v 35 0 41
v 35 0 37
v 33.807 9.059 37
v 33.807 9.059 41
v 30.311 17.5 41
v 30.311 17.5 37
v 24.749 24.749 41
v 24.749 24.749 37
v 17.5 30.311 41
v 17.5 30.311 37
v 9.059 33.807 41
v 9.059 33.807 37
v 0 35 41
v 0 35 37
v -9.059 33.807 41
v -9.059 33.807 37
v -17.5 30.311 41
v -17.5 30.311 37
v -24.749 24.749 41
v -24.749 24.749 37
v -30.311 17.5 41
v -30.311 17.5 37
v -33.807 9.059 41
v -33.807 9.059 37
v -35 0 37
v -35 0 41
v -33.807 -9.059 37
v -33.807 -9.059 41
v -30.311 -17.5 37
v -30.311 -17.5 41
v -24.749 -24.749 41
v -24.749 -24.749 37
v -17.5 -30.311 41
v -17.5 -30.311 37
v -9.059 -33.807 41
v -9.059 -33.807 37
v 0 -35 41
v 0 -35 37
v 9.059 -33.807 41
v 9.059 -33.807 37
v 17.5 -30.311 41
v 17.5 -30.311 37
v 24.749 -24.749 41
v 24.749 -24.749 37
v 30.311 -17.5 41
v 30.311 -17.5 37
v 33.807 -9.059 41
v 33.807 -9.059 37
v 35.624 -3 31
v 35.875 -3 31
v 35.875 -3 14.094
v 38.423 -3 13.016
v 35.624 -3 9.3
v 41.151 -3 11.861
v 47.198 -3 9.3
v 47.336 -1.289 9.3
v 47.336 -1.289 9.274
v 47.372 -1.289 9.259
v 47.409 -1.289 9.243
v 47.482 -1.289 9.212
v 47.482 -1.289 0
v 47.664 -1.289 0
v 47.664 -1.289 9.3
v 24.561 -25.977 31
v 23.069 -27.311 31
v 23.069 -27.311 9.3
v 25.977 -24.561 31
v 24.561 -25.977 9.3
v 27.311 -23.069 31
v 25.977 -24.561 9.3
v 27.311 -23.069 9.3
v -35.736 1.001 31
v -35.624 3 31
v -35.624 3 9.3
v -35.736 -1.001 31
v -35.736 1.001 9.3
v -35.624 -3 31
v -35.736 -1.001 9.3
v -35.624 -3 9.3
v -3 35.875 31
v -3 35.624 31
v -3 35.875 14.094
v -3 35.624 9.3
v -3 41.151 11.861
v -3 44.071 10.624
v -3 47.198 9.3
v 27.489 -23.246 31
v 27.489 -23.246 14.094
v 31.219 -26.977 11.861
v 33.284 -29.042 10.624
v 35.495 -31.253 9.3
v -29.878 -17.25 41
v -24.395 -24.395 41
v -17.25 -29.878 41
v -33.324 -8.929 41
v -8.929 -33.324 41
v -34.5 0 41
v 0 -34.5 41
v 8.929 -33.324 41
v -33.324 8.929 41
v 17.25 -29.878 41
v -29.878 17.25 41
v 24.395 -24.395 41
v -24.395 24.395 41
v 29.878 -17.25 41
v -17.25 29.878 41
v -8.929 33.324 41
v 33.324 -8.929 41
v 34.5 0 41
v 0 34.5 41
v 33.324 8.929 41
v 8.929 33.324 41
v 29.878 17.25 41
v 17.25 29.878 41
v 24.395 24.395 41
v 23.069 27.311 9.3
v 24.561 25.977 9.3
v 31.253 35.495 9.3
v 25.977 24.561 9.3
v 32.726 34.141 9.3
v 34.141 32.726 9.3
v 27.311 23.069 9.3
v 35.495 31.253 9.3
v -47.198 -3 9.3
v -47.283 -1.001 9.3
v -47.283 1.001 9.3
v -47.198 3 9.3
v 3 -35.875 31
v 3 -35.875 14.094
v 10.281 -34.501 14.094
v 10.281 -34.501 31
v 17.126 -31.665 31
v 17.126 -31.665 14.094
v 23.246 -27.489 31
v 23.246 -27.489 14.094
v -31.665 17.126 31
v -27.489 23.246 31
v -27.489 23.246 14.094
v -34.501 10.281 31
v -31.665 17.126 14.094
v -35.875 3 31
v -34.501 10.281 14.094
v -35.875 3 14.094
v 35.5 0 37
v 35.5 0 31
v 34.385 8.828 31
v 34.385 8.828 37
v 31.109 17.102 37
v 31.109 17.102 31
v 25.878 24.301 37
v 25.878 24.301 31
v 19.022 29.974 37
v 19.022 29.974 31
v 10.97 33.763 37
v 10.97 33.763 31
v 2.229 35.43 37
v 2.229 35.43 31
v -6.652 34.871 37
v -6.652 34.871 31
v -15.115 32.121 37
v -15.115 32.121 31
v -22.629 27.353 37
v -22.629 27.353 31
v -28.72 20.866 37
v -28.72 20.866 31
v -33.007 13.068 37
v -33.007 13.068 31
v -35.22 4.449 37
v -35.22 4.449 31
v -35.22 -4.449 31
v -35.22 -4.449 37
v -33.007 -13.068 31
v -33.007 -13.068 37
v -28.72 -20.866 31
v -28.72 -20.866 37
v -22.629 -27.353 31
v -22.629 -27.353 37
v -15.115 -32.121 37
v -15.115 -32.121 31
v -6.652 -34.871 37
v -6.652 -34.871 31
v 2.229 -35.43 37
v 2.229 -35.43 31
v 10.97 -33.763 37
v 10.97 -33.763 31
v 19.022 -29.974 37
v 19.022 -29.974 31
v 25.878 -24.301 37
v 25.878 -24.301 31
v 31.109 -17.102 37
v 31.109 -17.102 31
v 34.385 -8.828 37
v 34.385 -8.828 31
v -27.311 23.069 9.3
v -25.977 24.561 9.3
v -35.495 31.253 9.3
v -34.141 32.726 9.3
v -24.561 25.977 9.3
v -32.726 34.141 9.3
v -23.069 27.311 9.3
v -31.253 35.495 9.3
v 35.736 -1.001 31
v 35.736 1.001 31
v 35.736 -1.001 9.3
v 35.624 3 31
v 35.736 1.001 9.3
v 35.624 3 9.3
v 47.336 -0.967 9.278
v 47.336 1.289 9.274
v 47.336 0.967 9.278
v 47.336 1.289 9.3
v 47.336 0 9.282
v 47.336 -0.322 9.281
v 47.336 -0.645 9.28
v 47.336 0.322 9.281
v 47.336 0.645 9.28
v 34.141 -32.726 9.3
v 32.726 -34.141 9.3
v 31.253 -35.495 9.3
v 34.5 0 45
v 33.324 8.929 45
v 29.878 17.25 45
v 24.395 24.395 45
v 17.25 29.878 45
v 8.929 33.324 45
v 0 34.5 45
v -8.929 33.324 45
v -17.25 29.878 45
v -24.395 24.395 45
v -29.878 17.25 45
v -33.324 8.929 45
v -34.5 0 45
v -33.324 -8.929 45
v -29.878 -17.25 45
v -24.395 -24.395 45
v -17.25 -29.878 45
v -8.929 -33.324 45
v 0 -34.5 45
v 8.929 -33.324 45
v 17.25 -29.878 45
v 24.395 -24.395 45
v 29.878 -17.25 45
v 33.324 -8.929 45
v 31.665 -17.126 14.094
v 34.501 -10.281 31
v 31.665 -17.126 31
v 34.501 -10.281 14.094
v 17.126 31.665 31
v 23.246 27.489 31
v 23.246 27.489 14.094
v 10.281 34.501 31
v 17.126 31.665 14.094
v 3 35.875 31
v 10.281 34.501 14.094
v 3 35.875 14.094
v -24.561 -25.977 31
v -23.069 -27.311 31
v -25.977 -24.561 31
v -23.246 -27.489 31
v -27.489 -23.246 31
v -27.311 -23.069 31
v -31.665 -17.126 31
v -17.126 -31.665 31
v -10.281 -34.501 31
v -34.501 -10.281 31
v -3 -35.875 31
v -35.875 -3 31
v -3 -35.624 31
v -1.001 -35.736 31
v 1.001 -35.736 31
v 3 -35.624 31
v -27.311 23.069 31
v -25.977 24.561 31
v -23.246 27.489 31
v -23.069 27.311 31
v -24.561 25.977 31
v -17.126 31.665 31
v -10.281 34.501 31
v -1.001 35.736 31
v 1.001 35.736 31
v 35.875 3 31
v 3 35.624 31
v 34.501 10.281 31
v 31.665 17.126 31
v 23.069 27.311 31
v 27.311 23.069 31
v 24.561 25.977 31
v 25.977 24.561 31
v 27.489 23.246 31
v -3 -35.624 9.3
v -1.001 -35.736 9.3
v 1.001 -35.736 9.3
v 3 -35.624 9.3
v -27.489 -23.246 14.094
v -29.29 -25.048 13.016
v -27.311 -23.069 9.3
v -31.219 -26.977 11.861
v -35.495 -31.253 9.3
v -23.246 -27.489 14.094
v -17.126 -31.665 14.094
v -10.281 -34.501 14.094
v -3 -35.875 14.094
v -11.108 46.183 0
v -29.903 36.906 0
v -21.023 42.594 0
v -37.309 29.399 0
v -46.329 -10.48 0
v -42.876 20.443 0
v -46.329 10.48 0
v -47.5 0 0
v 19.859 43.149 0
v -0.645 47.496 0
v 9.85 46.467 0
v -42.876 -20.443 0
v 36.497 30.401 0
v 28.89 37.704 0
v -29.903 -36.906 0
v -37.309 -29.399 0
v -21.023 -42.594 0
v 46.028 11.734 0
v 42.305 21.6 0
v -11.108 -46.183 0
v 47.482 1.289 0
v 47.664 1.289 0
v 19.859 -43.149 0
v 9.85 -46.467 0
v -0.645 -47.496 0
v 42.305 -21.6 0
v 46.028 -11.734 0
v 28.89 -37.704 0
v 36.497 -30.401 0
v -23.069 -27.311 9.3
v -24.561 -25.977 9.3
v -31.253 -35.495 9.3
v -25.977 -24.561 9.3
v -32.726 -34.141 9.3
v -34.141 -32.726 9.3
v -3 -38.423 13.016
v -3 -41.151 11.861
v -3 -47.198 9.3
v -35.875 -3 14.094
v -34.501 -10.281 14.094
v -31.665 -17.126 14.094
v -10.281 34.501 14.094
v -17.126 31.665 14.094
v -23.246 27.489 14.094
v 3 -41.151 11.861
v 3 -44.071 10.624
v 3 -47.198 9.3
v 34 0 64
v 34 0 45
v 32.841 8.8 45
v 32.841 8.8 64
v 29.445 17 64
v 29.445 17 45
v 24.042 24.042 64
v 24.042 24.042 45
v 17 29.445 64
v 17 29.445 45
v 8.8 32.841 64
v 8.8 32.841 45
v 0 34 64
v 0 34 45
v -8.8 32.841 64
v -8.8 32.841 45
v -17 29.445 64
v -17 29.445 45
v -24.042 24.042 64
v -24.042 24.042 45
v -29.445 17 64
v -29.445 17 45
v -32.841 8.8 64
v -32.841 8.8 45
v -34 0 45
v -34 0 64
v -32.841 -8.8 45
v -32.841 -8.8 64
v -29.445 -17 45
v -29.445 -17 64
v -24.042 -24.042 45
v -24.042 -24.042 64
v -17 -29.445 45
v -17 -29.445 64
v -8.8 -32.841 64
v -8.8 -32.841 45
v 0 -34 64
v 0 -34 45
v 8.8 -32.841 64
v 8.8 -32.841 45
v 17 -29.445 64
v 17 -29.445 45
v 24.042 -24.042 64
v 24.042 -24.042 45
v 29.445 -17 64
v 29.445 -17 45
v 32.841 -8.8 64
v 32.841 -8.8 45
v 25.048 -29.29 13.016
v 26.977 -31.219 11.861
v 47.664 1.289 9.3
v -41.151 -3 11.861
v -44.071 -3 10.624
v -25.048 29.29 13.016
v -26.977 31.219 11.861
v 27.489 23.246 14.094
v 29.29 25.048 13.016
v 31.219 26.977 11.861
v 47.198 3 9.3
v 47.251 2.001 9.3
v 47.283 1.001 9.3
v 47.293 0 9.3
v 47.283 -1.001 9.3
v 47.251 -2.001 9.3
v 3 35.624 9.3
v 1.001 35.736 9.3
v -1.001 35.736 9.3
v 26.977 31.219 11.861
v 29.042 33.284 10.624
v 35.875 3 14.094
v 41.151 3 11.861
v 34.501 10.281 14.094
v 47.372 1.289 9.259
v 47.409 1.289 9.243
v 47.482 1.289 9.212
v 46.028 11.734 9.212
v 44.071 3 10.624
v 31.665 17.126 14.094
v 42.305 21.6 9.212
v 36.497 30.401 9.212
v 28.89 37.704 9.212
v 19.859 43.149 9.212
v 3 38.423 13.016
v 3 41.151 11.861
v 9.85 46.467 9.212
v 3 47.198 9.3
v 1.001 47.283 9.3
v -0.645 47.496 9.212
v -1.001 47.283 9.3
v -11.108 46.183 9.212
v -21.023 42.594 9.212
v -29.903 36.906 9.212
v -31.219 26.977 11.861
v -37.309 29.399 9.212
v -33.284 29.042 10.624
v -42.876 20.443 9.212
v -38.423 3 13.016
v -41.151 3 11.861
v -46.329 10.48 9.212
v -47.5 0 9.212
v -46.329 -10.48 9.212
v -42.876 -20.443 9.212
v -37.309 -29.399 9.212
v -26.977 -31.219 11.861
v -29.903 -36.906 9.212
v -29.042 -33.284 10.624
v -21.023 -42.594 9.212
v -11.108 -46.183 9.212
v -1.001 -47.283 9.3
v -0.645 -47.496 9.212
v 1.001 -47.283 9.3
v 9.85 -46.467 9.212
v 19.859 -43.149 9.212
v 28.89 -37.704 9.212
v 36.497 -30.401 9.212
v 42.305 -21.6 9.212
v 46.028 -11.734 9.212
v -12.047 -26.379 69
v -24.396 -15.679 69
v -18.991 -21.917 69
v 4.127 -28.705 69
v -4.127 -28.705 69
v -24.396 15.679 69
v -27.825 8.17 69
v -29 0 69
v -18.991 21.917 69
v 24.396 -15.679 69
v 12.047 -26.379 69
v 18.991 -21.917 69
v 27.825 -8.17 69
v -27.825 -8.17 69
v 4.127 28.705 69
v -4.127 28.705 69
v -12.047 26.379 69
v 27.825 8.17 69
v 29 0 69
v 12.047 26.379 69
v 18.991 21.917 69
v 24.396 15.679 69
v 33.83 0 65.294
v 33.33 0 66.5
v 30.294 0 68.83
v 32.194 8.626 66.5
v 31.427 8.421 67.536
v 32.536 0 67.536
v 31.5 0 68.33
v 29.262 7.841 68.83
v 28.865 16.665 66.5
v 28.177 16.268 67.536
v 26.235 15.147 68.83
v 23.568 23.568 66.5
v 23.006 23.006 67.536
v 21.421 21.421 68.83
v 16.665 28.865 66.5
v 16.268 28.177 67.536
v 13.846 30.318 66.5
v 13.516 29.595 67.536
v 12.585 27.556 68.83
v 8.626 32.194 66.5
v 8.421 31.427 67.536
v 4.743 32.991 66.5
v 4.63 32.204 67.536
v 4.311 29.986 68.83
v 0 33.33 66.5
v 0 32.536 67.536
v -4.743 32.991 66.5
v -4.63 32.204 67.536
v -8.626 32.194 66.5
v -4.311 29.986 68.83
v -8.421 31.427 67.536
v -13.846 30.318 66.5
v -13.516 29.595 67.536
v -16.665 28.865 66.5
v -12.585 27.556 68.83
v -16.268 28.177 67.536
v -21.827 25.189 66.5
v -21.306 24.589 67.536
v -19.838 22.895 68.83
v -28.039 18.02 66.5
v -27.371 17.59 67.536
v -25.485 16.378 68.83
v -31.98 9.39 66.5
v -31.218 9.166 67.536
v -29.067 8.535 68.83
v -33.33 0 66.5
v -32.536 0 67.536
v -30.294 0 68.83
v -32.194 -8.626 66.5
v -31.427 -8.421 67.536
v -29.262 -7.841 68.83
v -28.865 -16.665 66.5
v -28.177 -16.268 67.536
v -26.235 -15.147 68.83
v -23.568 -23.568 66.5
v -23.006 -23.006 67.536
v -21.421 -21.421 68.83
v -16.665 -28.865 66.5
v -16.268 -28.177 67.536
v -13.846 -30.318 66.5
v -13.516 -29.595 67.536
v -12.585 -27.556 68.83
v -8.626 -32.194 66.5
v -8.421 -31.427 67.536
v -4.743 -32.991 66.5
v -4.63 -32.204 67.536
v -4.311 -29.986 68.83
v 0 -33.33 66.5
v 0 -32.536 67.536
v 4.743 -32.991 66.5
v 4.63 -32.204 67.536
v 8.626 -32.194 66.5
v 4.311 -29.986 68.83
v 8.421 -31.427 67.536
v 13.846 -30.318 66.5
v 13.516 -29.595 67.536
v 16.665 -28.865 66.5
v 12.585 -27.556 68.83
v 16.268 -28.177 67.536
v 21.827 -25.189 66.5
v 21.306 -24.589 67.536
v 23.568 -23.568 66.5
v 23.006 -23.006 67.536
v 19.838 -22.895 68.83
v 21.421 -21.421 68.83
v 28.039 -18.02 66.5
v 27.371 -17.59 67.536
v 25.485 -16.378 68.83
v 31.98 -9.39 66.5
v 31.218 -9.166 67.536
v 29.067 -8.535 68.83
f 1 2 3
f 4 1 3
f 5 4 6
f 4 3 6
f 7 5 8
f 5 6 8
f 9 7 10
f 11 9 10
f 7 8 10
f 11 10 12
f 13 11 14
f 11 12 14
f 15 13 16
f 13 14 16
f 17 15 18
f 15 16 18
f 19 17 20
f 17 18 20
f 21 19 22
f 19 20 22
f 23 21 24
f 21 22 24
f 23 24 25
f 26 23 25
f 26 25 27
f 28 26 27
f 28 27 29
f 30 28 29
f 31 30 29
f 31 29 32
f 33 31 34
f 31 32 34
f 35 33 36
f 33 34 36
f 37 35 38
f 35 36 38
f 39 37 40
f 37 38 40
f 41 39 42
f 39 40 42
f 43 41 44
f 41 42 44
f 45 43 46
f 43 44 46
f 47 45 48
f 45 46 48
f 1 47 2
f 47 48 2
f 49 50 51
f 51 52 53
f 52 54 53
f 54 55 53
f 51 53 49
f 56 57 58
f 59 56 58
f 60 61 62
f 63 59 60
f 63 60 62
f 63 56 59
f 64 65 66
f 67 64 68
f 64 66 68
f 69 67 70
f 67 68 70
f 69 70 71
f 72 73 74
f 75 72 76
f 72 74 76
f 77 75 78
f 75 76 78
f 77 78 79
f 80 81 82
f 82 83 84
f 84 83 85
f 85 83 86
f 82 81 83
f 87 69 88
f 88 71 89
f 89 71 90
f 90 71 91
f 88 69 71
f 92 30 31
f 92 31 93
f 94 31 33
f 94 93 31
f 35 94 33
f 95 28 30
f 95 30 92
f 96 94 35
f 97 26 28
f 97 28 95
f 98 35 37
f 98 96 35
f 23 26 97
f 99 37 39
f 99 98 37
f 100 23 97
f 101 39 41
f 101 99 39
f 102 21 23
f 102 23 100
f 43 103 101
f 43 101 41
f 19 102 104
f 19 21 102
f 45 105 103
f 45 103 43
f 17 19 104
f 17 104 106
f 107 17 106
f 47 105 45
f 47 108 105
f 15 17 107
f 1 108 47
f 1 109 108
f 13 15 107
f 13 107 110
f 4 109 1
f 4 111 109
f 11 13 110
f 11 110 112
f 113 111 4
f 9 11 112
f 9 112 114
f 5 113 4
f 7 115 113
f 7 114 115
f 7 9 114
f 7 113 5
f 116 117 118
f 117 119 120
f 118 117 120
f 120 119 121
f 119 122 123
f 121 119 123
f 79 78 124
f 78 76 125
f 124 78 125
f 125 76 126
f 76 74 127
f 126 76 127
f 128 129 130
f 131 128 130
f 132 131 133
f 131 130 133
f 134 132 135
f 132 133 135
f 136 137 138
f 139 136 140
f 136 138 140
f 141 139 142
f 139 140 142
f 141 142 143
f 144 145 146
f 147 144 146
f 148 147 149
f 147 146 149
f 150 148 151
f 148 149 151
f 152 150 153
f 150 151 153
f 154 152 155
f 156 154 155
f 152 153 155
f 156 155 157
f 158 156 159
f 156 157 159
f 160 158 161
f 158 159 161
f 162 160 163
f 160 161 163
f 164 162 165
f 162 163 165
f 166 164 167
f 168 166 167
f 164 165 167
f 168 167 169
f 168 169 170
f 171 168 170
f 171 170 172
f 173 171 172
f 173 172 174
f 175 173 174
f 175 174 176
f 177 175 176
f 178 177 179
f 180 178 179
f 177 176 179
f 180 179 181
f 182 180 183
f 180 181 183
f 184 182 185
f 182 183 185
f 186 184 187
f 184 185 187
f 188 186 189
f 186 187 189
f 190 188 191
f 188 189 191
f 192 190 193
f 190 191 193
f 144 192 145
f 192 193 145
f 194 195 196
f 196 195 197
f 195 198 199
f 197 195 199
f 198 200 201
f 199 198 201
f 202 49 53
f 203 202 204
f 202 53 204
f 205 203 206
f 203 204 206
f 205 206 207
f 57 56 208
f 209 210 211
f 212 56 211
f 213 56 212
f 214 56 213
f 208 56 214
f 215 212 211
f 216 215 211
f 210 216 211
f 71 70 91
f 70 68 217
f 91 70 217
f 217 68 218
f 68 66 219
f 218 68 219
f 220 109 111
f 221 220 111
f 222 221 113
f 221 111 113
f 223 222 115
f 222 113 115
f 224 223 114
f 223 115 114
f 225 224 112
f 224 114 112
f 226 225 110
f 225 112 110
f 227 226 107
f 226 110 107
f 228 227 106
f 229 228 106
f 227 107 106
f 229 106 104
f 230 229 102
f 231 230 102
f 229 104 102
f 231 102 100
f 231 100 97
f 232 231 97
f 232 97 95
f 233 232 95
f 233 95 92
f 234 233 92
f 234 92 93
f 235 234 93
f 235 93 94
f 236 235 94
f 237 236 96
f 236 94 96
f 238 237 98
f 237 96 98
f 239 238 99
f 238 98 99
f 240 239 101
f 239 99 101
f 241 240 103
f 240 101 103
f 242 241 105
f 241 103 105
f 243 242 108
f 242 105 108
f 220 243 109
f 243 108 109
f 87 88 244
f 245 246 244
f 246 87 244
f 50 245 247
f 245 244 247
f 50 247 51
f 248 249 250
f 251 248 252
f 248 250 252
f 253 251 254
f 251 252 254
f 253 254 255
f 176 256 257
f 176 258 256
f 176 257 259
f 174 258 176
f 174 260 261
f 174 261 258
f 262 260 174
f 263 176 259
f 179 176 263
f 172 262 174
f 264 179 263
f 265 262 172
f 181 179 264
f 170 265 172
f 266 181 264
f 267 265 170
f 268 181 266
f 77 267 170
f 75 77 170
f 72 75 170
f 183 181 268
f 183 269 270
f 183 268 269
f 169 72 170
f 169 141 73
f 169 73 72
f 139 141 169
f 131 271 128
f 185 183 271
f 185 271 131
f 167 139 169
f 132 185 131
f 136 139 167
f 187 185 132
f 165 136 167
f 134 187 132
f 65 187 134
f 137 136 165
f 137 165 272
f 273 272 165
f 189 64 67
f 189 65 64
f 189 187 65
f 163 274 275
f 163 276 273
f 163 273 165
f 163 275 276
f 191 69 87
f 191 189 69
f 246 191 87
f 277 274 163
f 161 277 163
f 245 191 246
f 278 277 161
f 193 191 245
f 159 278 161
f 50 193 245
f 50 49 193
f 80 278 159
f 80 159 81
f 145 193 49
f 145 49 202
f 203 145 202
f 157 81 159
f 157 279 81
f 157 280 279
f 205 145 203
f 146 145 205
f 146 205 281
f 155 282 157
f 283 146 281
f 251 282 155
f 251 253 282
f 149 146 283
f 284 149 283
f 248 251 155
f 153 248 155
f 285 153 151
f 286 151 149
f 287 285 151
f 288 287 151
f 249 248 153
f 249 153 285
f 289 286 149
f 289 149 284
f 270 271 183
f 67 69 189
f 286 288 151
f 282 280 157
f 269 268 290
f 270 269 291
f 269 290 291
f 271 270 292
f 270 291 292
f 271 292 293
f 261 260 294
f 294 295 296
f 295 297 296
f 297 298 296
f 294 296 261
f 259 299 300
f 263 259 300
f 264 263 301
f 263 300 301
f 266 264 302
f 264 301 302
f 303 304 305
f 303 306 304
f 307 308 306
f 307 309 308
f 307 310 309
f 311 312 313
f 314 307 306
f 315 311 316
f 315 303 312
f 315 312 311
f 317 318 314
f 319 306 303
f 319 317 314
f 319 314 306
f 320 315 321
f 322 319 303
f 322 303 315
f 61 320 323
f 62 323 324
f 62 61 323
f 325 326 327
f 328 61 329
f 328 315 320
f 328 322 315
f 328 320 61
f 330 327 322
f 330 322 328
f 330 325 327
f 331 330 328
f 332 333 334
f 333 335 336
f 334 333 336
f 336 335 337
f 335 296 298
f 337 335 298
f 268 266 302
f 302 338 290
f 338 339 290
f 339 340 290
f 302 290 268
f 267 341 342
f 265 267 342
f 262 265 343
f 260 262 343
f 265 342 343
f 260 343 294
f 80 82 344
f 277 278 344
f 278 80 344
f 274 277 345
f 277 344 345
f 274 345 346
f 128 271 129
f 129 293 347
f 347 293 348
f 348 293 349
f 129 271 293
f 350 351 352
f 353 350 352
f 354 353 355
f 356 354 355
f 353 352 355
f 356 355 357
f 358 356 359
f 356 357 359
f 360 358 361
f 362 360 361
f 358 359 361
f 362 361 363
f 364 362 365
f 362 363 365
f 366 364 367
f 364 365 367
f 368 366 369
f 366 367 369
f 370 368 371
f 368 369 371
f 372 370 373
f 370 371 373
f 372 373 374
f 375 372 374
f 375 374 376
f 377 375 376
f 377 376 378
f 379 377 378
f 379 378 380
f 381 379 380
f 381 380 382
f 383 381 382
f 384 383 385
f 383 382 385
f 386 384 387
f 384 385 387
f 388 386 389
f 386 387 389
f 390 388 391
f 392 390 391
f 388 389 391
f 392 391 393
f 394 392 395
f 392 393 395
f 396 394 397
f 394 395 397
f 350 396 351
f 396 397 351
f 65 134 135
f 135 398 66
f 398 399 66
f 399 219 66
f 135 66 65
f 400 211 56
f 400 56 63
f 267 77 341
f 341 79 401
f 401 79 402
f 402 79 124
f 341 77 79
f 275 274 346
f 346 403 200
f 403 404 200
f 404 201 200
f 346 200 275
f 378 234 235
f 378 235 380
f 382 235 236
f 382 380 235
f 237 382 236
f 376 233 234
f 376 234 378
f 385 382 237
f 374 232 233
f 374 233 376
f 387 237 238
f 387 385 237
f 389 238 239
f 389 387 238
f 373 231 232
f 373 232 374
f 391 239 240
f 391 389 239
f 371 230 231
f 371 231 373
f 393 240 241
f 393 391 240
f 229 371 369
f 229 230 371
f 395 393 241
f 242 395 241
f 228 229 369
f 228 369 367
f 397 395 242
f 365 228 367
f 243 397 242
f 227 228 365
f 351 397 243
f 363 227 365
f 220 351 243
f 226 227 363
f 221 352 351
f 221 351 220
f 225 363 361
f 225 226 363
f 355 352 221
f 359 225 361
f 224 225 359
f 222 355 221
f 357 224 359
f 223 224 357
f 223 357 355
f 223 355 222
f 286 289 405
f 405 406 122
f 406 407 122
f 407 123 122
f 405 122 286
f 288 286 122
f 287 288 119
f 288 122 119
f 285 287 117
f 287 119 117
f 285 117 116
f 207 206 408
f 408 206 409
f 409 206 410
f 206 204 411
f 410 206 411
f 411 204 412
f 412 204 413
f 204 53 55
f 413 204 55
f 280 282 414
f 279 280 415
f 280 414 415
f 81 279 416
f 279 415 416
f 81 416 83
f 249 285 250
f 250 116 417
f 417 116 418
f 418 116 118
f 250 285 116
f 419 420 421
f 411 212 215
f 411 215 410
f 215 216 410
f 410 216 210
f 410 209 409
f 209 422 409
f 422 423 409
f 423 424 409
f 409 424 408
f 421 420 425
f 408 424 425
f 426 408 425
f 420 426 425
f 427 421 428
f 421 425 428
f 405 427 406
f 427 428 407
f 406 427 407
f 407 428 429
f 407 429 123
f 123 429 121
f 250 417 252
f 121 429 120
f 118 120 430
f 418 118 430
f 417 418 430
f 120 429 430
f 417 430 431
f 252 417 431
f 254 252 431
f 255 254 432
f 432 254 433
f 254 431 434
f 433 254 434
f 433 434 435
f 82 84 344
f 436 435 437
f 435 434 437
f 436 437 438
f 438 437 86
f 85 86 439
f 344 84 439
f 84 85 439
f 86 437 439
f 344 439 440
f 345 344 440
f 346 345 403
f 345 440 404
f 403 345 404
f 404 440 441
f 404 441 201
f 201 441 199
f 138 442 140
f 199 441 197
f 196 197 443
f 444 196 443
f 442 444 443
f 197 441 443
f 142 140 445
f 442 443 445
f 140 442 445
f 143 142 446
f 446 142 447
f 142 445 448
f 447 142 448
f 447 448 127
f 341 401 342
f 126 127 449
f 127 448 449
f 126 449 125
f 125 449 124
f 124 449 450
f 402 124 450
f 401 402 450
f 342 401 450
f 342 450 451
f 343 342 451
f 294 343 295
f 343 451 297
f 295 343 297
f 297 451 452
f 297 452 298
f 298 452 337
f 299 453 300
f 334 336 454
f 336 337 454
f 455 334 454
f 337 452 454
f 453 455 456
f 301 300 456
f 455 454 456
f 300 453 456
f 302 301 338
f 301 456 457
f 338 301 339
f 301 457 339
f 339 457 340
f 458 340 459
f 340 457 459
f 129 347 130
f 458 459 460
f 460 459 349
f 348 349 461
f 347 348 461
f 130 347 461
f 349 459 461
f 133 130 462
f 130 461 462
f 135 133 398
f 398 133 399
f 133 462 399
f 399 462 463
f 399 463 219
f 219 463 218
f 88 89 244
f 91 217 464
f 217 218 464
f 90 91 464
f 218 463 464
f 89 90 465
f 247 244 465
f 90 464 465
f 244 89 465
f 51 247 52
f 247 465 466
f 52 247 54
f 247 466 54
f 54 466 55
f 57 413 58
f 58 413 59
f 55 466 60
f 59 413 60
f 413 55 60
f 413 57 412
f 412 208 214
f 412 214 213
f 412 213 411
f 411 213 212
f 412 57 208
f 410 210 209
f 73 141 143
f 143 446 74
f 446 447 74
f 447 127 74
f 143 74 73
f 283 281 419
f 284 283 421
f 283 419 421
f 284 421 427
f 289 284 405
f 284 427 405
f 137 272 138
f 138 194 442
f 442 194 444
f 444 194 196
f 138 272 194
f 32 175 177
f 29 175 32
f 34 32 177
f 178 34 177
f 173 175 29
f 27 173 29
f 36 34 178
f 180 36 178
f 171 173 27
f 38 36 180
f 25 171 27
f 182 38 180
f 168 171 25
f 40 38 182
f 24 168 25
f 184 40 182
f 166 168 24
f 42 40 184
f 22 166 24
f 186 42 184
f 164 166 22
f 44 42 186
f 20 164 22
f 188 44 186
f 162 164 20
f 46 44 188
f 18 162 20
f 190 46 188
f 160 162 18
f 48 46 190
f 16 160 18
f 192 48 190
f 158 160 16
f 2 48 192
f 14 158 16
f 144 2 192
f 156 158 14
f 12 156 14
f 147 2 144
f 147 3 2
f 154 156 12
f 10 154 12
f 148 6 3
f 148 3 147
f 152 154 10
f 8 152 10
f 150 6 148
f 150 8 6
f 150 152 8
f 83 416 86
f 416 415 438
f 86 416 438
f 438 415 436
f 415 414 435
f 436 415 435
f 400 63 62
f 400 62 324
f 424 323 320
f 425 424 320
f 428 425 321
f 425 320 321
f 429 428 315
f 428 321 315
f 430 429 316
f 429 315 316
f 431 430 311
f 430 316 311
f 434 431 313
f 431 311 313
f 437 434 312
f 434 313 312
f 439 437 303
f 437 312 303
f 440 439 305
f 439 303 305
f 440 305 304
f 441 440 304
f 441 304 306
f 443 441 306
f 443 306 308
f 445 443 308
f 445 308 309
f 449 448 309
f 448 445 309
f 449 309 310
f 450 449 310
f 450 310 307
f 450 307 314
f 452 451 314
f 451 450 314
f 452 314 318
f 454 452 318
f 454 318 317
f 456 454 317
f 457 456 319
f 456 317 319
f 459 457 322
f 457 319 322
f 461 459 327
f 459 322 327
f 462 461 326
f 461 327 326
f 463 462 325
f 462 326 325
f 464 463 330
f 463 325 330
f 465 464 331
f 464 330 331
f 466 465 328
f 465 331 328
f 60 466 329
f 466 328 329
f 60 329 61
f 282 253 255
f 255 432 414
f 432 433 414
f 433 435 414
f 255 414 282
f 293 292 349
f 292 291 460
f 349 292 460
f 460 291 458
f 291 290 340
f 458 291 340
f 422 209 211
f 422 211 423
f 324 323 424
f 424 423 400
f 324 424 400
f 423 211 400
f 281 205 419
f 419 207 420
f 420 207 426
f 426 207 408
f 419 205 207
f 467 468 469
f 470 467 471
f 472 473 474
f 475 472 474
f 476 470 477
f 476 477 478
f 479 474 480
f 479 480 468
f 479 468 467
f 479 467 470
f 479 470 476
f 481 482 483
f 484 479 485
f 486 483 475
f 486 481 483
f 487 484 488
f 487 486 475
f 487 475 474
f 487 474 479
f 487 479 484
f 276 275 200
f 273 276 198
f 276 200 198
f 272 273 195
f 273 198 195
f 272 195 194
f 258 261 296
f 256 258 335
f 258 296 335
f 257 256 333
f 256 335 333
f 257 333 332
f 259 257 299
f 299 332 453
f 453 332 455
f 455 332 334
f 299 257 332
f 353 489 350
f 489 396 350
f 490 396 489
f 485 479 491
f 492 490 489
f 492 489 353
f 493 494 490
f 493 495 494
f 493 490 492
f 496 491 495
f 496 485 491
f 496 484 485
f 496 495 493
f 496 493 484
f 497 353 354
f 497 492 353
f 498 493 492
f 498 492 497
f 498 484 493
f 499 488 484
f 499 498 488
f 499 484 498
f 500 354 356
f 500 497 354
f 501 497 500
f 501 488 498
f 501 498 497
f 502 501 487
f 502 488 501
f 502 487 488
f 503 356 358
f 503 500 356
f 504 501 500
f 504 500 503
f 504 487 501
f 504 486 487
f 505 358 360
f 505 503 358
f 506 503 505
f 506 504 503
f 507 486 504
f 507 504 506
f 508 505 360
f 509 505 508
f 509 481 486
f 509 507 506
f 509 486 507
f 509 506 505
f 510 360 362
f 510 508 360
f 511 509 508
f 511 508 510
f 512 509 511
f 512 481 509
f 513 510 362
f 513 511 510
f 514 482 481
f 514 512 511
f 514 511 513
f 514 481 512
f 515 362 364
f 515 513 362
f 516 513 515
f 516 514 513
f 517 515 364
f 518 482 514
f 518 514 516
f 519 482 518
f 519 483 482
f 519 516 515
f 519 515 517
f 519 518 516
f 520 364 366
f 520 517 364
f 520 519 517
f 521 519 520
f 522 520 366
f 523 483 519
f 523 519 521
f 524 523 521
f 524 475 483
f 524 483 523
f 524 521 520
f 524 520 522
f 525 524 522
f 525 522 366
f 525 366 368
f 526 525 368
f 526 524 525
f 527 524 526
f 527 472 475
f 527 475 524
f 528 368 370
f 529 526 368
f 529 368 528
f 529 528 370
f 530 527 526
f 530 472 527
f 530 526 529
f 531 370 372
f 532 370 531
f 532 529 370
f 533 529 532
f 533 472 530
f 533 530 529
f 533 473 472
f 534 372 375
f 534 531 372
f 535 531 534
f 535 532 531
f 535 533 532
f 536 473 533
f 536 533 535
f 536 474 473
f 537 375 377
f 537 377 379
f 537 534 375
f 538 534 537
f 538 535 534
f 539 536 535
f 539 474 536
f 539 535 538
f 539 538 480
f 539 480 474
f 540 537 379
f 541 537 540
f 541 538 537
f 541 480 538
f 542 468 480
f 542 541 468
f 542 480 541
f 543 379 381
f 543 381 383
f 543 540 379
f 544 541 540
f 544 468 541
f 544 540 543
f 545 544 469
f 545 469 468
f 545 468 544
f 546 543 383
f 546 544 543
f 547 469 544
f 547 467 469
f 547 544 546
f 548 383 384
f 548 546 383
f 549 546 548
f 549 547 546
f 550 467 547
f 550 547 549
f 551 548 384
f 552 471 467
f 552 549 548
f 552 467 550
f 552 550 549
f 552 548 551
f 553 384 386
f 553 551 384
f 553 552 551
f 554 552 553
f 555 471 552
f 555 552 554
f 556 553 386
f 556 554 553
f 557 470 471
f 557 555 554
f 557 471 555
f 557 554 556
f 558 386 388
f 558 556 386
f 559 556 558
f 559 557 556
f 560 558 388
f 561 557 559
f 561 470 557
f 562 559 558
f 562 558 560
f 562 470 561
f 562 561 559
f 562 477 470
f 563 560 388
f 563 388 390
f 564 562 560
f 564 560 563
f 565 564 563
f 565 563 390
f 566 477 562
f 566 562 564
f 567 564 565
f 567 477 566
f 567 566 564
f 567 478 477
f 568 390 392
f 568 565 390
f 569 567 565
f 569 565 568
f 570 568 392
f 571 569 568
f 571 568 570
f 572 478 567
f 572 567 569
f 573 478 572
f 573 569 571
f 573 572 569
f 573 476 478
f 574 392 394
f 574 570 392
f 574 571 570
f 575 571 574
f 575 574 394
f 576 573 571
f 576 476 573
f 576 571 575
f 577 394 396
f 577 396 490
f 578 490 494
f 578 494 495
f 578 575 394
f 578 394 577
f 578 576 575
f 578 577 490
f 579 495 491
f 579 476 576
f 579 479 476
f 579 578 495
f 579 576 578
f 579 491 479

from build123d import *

# Parameters (mm, degrees)
CROQUIS1_R              = 47.5
SALIENTE_EXTRUIR1_DEPTH = 9
CROQUIS2_R              = 36
SALIENTE_EXTRUIR2_DEPTH = 22
CROQUIS3_R              = 35.5
SALIENTE_EXTRUIR3_DEPTH = 6
CROQUIS4_R              = 35
SALIENTE_EXTRUIR4_DEPTH = 4
CROQUIS5_R              = 34.5
SALIENTE_EXTRUIR5_DEPTH = 4
CROQUIS6_R              = 34
SALIENTE_EXTRUIR6_DEPTH = 24
REDONDEO1_R             = 5
CHAFL_N1_SIZE           = 5.093697795
CHAFL_N1_SIZE_2         = 12
CORTAR_EXTRUIR1_START   = -59.7
CORTAR_EXTRUIR1_DEPTH   = 59.7
MATRIZC1_COUNT          = 8
SALIENTE_EXTRUIR7_REACH = 91.87
CROQUIS8_W              = 0.328373722
CROQUIS8_H              = 2.57874632


with BuildPart() as part:
    # Croquis1 → Saliente-Extruir1 (new body)
    with BuildSketch(Plane.XY):
        Circle(CROQUIS1_R)
    extrude(amount=SALIENTE_EXTRUIR1_DEPTH)

    # Croquis2 → Saliente-Extruir2 (add)
    with BuildSketch(Plane.XY.offset(9)):
        Circle(CROQUIS2_R)
    extrude(amount=SALIENTE_EXTRUIR2_DEPTH)

    # Croquis3 → Saliente-Extruir3 (add)
    with BuildSketch(Plane.XY.offset(31)):
        Circle(CROQUIS3_R)
    extrude(amount=SALIENTE_EXTRUIR3_DEPTH)

    # Croquis4 → Saliente-Extruir4 (add)
    with BuildSketch(Plane.XY.offset(37)):
        Circle(CROQUIS4_R)
    extrude(amount=SALIENTE_EXTRUIR4_DEPTH)

    # Croquis5 → Saliente-Extruir5 (add)
    with BuildSketch(Plane.XY.offset(41)):
        Circle(CROQUIS5_R)
    extrude(amount=SALIENTE_EXTRUIR5_DEPTH)

    # Croquis6 → Saliente-Extruir6 (add)
    with BuildSketch(Plane.XY.offset(45)):
        Circle(CROQUIS6_R)
    extrude(amount=SALIENTE_EXTRUIR6_DEPTH)

    # Redondeo1
    redondeo1_edges = [part.edges().sort_by_distance(p)[0] for p in [
        (-34, 0, 69),
    ]]
    fillet(redondeo1_edges, radius=REDONDEO1_R)

    # Chaflán1
    # the kernel refuses this chamfer: 12, 5.093697795 mm, written as the material it adds along each edge
    with BuildSketch(Plane(origin=(0, 0, 9), x_dir=(1, 0, 0), z_dir=(0, -1, 0))) as chafl_n1_piece_1_section:
        Polygon((36, CHAFL_N1_SIZE), (36 + CHAFL_N1_SIZE_2, 0), (36, 0), align=None)
    chafl_n1_piece_1 = revolve(axis=Axis((0, 0, 9), (0, 0, 1)), mode=Mode.PRIVATE)
    chafl_n1_piece_1 = chafl_n1_piece_1 & Plane(origin=(0, 0, 11.556485036), x_dir=(1, 0, 0), z_dir=(0, 0, -1)) * Cylinder(47.5, 192, mode=Mode.PRIVATE)
    add(chafl_n1_piece_1)

    # Croquis7 → Cortar-Extruir1 (cut)
    with BuildSketch(Plane.XY.offset(69).offset(CORTAR_EXTRUIR1_START)):
        with BuildLine():
            Line((-47.405168495, 3), (-35.624047548, 3))
            ThreePointArc((-35.624047548, 3), (-35.750143548, 0), (-35.624047548, -3))
            Line((-35.624047548, -3), (-47.405168495, -3))
            ThreePointArc((-47.405168495, -3), (-47.5, 0), (-47.405168495, 3))
        make_face()
    cortar_extruir1 = extrude(amount=CORTAR_EXTRUIR1_DEPTH, mode=Mode.SUBTRACT)

    # MatrizC1: Cortar-Extruir1 ×8 about axis
    matrizc1_axis = Axis((0, 0, 0), (0, 0, 1))
    for i in range(1, MATRIZC1_COUNT):
        add(cortar_extruir1.rotate(matrizc1_axis, i * 360 / MATRIZC1_COUNT), mode=Mode.SUBTRACT)

    # Saliente-Extruir7: up to this face of the body (flat: up to its plane)
    saliente_extruir7_end = Plane(part.part.faces().sort_by_distance((0, 0, 0))[0])
    # Croquis8 → Saliente-Extruir7 (add, up to the picked face)
    with BuildSketch(Plane.XY.offset(9.3), mode=Mode.PRIVATE) as saliente_extruir7_sk1:
        with Locations((47.5, 0)):
            Rectangle(CROQUIS8_W, CROQUIS8_H)
    saliente_extruir7_tool1 = split(extrude(saliente_extruir7_sk1.sketch, amount=-SALIENTE_EXTRUIR7_REACH, mode=Mode.PRIVATE), bisect_by=saliente_extruir7_end, keep=Keep.BOTH, mode=Mode.PRIVATE)
    add(saliente_extruir7_tool1.solids().sort_by(Axis((47.5, 0, 9.3), (0, 0, -1)))[0])


solid = part.part
